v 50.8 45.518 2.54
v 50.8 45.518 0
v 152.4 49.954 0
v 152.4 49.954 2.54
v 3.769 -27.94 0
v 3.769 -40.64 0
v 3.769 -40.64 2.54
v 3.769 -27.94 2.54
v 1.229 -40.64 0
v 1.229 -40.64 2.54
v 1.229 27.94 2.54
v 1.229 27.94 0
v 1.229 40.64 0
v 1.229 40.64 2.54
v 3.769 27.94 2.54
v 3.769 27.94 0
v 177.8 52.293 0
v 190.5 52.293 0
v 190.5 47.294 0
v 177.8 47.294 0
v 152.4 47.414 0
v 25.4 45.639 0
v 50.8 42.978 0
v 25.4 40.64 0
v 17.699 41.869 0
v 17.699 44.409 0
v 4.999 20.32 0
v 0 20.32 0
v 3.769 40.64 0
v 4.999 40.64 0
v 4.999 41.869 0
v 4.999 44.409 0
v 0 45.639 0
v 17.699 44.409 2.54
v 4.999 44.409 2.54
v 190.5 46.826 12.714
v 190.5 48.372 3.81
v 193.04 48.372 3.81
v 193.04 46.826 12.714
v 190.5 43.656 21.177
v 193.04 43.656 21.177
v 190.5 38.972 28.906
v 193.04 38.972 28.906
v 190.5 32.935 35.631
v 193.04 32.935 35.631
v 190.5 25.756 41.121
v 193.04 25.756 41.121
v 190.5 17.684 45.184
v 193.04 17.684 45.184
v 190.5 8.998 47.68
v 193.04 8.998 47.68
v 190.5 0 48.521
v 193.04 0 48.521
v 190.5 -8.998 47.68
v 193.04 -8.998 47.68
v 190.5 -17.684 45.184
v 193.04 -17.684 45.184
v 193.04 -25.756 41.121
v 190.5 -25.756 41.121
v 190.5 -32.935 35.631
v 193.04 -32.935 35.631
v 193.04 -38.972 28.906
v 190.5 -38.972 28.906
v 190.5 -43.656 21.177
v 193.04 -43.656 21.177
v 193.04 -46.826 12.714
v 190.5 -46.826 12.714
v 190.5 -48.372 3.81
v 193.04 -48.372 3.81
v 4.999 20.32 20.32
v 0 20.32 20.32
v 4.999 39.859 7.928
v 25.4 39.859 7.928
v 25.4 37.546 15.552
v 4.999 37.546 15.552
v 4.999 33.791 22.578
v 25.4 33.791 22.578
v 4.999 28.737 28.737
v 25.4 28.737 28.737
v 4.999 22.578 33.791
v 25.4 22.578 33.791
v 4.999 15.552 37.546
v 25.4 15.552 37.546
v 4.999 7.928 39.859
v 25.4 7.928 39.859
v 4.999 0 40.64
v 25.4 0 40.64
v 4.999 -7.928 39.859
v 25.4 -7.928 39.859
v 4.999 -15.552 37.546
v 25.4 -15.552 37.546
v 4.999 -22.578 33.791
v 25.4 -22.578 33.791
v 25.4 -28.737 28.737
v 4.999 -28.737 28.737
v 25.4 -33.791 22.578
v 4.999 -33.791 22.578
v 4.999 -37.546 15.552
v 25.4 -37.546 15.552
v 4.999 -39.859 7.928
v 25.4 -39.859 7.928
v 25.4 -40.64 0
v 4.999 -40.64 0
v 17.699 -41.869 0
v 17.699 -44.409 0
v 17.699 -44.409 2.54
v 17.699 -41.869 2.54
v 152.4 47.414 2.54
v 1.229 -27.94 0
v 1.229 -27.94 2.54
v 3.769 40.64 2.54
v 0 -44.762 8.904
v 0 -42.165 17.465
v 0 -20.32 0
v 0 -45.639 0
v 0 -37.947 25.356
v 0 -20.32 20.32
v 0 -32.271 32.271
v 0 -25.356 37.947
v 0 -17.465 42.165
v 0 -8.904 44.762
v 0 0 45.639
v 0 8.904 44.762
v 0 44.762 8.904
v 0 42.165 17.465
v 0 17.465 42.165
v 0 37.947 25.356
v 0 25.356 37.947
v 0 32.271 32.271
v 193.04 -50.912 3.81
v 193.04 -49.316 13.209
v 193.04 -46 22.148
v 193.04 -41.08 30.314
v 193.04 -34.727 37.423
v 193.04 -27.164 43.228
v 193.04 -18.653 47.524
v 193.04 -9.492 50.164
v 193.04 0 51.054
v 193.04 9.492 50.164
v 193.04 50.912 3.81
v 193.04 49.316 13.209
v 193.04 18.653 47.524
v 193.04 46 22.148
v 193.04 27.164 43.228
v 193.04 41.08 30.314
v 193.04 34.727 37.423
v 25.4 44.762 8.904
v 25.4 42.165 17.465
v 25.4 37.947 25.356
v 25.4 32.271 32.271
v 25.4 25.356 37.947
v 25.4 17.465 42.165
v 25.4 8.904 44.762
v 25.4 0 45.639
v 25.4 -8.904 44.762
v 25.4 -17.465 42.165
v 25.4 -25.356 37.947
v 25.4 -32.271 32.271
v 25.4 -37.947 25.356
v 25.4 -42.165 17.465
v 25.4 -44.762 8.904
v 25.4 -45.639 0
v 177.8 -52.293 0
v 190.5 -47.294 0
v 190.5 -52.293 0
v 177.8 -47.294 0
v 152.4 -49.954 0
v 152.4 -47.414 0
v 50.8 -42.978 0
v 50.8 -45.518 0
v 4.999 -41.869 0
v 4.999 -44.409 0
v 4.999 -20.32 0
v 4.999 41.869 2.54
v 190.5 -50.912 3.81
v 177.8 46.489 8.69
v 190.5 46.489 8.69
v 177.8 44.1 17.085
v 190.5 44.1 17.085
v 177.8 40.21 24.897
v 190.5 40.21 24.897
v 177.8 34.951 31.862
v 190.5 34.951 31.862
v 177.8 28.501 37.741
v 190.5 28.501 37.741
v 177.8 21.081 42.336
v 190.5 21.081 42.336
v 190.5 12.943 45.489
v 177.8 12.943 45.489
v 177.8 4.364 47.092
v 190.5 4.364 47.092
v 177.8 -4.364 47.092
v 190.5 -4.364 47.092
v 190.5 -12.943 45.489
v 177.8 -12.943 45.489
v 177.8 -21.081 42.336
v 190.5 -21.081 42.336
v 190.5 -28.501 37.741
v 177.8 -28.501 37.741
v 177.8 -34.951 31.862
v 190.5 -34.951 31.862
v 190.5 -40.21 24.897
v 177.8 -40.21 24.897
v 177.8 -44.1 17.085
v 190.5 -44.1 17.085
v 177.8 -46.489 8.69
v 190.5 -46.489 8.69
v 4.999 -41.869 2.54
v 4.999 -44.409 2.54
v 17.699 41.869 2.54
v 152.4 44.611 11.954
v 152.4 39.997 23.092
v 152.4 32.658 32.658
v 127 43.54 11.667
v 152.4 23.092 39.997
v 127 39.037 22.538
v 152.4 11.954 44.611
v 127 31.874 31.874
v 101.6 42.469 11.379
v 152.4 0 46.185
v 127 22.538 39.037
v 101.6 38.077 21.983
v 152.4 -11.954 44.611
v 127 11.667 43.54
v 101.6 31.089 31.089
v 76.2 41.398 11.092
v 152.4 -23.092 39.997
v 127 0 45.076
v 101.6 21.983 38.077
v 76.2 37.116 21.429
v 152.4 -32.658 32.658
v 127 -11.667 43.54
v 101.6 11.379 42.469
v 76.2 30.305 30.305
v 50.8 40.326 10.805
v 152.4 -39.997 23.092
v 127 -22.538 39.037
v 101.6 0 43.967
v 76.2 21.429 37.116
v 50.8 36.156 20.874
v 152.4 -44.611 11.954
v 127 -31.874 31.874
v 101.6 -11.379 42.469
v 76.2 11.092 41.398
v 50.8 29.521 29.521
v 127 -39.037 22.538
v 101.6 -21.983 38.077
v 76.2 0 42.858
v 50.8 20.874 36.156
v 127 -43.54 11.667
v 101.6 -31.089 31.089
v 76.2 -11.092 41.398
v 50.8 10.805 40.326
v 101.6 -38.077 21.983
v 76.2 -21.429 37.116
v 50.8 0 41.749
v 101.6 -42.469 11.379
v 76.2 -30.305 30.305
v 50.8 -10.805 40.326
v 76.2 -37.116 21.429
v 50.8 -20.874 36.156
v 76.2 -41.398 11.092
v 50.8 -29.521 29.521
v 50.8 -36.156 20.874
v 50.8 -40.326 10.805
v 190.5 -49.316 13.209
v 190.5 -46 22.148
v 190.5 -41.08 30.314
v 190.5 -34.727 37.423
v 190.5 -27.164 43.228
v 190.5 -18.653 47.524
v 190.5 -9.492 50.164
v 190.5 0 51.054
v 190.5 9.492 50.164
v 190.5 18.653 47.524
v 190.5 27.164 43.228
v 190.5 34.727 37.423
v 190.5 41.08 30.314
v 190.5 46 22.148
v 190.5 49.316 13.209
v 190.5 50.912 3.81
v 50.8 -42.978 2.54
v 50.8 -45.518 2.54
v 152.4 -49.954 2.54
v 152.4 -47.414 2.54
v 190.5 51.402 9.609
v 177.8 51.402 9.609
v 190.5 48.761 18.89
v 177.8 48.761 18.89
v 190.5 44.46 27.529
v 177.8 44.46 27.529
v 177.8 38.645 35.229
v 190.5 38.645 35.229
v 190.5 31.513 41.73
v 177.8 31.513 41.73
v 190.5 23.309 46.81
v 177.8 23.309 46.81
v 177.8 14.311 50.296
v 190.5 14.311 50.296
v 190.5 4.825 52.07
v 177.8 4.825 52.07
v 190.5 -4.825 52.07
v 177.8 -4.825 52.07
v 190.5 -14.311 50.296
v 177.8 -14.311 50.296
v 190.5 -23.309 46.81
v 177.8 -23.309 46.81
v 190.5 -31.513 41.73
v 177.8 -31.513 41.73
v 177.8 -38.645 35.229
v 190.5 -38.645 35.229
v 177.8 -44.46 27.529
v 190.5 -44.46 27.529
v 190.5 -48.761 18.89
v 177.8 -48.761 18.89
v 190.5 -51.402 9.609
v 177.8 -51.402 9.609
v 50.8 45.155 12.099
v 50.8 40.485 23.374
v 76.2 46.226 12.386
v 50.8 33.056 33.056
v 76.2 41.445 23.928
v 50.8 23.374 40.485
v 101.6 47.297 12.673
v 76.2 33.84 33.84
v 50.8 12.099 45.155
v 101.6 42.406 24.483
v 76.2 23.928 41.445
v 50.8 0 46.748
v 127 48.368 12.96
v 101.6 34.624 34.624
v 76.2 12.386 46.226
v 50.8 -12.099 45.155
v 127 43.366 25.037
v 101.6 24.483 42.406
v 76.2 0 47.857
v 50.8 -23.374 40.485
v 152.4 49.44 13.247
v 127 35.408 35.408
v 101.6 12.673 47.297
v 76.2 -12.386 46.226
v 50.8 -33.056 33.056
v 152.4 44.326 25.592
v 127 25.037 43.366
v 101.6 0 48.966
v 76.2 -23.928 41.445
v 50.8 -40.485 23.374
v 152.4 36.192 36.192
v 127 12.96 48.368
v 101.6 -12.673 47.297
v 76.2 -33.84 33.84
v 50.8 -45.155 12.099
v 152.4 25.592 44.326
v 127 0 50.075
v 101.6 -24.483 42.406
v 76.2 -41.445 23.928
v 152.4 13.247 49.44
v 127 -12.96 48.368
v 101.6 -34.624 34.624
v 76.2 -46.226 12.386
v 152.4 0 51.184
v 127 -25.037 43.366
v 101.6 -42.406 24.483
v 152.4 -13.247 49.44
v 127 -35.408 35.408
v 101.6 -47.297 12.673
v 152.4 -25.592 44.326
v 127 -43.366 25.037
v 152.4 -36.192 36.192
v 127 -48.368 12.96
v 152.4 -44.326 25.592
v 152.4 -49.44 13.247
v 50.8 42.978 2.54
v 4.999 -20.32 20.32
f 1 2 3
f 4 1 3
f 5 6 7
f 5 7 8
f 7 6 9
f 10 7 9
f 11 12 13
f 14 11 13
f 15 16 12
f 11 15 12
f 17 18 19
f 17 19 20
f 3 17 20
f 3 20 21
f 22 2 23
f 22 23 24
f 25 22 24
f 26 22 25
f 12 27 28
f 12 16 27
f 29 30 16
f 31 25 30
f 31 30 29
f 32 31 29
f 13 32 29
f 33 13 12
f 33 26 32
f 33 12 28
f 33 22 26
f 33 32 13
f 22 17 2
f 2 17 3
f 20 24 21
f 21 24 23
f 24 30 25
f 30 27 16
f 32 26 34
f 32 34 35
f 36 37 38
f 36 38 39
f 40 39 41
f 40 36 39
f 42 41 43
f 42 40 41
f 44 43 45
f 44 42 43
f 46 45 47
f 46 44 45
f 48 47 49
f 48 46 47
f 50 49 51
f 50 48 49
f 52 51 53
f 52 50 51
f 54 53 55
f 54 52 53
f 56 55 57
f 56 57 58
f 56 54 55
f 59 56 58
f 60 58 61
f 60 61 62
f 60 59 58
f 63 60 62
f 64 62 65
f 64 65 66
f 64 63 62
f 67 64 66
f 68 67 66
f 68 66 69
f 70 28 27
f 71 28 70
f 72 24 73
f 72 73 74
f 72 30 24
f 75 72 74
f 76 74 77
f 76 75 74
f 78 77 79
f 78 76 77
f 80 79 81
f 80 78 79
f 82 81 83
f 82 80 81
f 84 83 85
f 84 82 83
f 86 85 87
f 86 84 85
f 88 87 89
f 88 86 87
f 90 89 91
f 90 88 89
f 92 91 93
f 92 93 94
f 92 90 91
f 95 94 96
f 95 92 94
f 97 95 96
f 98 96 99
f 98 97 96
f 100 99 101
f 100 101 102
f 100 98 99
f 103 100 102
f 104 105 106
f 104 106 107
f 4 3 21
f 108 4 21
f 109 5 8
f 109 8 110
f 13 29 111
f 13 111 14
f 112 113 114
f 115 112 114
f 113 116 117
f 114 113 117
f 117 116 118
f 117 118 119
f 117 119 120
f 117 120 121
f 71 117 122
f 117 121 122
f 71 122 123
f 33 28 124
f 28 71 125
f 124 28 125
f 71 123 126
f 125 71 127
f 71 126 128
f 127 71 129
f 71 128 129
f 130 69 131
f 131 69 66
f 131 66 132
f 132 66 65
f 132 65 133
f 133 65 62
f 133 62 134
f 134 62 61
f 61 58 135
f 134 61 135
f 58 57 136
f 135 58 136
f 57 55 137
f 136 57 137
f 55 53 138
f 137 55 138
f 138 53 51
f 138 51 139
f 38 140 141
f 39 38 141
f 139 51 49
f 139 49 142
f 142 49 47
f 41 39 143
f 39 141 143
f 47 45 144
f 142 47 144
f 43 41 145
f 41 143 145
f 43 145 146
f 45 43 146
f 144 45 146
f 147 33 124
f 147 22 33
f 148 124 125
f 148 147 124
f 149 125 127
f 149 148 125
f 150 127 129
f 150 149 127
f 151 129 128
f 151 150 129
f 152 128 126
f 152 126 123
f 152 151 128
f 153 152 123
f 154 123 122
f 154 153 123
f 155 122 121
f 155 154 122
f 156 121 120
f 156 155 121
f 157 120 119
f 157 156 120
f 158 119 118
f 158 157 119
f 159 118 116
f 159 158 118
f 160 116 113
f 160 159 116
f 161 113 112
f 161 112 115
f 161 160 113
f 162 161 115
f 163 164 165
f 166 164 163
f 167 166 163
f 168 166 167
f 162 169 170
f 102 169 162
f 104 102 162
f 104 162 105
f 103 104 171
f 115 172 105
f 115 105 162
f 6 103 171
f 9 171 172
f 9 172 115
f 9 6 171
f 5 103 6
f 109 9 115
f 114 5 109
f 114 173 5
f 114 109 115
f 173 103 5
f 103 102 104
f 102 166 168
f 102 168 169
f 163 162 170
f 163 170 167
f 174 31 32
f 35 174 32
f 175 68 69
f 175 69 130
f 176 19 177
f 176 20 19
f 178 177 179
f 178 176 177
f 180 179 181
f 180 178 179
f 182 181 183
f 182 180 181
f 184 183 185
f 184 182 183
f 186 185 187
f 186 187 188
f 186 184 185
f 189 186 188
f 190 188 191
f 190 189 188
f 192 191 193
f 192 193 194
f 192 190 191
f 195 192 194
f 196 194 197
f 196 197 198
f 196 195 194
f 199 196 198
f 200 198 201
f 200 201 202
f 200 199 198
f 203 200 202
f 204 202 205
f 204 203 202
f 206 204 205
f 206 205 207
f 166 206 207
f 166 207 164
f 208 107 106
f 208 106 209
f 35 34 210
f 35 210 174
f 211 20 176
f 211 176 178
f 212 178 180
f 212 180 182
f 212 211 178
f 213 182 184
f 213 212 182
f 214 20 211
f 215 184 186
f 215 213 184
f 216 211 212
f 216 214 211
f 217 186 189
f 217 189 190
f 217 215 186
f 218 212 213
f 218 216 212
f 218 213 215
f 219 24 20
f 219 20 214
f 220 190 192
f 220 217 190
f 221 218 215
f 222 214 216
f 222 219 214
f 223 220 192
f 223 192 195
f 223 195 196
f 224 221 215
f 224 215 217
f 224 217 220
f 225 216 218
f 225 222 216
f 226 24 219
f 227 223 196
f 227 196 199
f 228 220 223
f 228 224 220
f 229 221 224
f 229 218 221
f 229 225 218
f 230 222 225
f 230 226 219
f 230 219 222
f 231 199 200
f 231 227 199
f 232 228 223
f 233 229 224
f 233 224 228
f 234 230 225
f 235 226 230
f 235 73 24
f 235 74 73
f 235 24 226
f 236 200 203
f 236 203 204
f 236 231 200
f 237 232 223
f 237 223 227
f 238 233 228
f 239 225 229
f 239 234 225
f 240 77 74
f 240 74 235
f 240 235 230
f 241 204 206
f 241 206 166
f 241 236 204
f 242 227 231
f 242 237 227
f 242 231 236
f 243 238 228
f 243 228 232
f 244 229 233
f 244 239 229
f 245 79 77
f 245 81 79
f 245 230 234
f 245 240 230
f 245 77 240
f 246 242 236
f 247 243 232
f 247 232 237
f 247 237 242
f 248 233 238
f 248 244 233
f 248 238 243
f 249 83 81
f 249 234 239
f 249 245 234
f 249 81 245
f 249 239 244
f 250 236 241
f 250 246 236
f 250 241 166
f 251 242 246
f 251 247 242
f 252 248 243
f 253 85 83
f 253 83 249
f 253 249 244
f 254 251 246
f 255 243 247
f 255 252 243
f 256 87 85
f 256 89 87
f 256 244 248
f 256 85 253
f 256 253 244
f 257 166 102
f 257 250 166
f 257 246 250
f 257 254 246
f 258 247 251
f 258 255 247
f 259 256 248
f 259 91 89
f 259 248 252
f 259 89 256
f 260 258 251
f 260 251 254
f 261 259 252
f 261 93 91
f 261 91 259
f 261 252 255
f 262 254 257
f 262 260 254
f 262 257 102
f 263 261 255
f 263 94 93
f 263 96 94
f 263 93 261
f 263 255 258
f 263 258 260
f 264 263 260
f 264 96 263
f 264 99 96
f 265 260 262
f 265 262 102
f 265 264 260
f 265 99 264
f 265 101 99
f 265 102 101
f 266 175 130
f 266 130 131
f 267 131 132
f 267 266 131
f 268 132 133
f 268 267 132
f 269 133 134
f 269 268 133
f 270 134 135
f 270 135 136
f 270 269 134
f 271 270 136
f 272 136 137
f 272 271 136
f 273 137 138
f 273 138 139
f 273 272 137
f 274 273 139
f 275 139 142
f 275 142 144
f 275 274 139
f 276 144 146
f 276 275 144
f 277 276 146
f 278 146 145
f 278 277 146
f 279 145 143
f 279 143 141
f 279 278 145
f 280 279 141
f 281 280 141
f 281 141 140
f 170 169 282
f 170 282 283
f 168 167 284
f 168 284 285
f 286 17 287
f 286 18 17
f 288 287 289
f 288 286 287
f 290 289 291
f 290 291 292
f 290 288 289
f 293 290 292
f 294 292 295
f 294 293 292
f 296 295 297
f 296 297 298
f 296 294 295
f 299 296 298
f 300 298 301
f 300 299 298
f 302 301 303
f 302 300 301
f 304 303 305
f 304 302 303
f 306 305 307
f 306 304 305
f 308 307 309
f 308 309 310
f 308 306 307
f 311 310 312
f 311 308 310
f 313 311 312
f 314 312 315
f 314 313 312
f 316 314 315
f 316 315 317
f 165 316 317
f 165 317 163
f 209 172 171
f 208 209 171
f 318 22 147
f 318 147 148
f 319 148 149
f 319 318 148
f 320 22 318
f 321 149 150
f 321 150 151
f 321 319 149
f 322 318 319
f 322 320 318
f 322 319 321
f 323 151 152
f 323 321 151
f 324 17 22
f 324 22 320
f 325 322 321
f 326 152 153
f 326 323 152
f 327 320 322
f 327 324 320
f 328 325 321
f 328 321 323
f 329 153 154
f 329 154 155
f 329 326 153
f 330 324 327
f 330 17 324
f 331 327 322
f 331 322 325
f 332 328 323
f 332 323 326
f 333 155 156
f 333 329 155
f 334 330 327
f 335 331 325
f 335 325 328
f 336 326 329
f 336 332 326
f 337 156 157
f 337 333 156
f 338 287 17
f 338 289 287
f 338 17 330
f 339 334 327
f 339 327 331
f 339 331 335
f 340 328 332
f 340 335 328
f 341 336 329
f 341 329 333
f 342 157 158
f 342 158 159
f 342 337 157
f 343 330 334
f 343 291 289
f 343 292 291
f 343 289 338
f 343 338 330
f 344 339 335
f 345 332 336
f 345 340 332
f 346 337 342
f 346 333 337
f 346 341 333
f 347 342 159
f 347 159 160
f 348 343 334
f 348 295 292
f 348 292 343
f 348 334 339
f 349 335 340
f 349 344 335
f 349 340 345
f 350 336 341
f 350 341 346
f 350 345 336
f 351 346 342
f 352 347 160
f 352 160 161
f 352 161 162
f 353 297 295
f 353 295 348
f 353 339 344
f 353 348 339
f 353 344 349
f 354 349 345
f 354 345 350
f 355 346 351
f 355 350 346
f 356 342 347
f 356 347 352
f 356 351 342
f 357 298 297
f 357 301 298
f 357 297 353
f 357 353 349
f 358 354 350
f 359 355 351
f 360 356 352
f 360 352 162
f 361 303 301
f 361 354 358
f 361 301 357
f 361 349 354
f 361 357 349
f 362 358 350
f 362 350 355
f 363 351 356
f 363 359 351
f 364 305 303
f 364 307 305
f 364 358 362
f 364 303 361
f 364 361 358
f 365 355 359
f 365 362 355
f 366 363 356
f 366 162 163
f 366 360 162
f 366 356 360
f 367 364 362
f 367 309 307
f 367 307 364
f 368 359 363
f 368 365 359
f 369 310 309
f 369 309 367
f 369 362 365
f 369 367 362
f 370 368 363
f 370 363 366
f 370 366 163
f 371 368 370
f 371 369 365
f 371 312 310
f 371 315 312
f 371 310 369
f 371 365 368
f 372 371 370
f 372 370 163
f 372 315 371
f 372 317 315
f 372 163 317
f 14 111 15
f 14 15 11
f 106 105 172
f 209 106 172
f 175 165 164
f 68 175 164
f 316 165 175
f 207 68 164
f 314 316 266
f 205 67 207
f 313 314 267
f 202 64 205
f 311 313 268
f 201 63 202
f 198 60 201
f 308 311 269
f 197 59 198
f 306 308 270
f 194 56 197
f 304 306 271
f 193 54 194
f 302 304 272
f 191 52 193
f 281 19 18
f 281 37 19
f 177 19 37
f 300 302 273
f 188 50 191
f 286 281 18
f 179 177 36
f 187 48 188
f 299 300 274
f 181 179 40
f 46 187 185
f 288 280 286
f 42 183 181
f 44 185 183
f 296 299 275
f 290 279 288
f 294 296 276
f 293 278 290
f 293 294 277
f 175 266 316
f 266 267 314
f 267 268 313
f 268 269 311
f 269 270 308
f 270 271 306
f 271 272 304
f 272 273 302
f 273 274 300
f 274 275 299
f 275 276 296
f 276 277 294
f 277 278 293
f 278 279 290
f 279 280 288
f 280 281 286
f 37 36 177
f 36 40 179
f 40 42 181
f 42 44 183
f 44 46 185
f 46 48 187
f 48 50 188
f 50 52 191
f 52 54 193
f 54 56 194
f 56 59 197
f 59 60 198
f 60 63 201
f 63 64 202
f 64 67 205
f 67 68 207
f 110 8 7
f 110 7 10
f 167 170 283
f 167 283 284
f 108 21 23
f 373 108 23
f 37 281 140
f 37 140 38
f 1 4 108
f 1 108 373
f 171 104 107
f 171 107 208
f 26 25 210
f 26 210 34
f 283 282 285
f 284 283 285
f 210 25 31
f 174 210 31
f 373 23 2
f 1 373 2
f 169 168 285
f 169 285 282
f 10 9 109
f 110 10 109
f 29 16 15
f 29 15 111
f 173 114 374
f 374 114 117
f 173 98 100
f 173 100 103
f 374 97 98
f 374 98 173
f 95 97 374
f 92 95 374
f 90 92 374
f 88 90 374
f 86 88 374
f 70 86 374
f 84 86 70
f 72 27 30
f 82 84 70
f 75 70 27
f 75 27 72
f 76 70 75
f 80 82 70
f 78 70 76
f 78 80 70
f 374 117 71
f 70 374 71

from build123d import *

# Parameters (mm, degrees)
REVOLVE2_ANGLE      = 180
SKETCH4_W           = 20.32
SKETCH4_H           = 20.32
CUT_EXTRUDE2_DEPTH  = 32.004
BOSS_EXTRUDE2_DEPTH = 2.54
SKETCH5_W           = 2.54
SKETCH5_H           = 12.7
SKETCH5_W_2         = 12.7
SKETCH5_H_2         = 2.54
CUT_EXTRUDE3_DEPTH  = 2.54


with BuildPart() as part:
    # Sketch2 → Revolve2 (revolve)
    with BuildSketch(Plane.XY):
        Polygon((0, 0), (0, 40.64), (0, 45.63872), (25.4, 45.63872), (177.8, 52.292647699), (190.5, 52.292647699), (190.5, 47.293927699), (177.8, 47.293927699), (25.4, 40.64), (4.99872, 40.64), (4.99872, 0), align=None)
    revolve(axis=Axis((0, 0, 0), (1, 0, 0)), revolution_arc=REVOLVE2_ANGLE)

    # Sketch4 → Cut-Extrude2 (cut)
    with BuildSketch(Plane.ZY):
        with Locations((10.16, 10.16)):
            Rectangle(SKETCH4_W, SKETCH4_H)
        with Locations((10.16, -10.16)):
            Rectangle(SKETCH4_W, SKETCH4_H)
    extrude(amount=-CUT_EXTRUDE2_DEPTH, mode=Mode.SUBTRACT)

    # Sketch6 → Boss-Extrude2 (add)
    with BuildSketch(Plane(origin=(190.5, 0, 0), x_dir=(0, 0, -1), z_dir=(1, 0, 0))):
        with BuildLine():
            Line((-3.81, 50.911637334), (-3.81, 48.371637334))
            ThreePointArc((-3.81, 48.371637334), (-48.52145297, 0), (-3.81, -48.371637334))
            Line((-3.81, -48.371637334), (-3.81, -50.911637334))
            ThreePointArc((-3.81, -50.911637334), (-51.054, 0), (-3.81, 50.911637334))
        make_face()
    extrude(amount=BOSS_EXTRUDE2_DEPTH)

    # Sketch5 → Cut-Extrude3 (cut)
    with BuildSketch(Plane(origin=(0, 0, 0), x_dir=(-1, 0, 0), z_dir=(0, 0, -1))):
        with Locations((-2.49936, 34.29)):
            Rectangle(SKETCH5_W, SKETCH5_H)
        Polygon((-152.4, 49.954299749), (-152.4, 47.414299749), (-50.8, 42.97834795), (-50.8, 45.51834795), align=None)
        with Locations((-11.34872, 43.13936)):
            Rectangle(SKETCH5_W_2, SKETCH5_H_2)
        Polygon((-50.8, -42.97834795), (-50.8, -45.51834795), (-152.4, -49.954299749), (-152.4, -47.414299749), align=None)
        with Locations((-11.34872, -43.13936)):
            Rectangle(SKETCH5_W_2, SKETCH5_H_2)
        with Locations((-2.49936, -34.29)):
            Rectangle(SKETCH5_W, SKETCH5_H)
    extrude(amount=-CUT_EXTRUDE3_DEPTH, mode=Mode.SUBTRACT)


solid = part.part
